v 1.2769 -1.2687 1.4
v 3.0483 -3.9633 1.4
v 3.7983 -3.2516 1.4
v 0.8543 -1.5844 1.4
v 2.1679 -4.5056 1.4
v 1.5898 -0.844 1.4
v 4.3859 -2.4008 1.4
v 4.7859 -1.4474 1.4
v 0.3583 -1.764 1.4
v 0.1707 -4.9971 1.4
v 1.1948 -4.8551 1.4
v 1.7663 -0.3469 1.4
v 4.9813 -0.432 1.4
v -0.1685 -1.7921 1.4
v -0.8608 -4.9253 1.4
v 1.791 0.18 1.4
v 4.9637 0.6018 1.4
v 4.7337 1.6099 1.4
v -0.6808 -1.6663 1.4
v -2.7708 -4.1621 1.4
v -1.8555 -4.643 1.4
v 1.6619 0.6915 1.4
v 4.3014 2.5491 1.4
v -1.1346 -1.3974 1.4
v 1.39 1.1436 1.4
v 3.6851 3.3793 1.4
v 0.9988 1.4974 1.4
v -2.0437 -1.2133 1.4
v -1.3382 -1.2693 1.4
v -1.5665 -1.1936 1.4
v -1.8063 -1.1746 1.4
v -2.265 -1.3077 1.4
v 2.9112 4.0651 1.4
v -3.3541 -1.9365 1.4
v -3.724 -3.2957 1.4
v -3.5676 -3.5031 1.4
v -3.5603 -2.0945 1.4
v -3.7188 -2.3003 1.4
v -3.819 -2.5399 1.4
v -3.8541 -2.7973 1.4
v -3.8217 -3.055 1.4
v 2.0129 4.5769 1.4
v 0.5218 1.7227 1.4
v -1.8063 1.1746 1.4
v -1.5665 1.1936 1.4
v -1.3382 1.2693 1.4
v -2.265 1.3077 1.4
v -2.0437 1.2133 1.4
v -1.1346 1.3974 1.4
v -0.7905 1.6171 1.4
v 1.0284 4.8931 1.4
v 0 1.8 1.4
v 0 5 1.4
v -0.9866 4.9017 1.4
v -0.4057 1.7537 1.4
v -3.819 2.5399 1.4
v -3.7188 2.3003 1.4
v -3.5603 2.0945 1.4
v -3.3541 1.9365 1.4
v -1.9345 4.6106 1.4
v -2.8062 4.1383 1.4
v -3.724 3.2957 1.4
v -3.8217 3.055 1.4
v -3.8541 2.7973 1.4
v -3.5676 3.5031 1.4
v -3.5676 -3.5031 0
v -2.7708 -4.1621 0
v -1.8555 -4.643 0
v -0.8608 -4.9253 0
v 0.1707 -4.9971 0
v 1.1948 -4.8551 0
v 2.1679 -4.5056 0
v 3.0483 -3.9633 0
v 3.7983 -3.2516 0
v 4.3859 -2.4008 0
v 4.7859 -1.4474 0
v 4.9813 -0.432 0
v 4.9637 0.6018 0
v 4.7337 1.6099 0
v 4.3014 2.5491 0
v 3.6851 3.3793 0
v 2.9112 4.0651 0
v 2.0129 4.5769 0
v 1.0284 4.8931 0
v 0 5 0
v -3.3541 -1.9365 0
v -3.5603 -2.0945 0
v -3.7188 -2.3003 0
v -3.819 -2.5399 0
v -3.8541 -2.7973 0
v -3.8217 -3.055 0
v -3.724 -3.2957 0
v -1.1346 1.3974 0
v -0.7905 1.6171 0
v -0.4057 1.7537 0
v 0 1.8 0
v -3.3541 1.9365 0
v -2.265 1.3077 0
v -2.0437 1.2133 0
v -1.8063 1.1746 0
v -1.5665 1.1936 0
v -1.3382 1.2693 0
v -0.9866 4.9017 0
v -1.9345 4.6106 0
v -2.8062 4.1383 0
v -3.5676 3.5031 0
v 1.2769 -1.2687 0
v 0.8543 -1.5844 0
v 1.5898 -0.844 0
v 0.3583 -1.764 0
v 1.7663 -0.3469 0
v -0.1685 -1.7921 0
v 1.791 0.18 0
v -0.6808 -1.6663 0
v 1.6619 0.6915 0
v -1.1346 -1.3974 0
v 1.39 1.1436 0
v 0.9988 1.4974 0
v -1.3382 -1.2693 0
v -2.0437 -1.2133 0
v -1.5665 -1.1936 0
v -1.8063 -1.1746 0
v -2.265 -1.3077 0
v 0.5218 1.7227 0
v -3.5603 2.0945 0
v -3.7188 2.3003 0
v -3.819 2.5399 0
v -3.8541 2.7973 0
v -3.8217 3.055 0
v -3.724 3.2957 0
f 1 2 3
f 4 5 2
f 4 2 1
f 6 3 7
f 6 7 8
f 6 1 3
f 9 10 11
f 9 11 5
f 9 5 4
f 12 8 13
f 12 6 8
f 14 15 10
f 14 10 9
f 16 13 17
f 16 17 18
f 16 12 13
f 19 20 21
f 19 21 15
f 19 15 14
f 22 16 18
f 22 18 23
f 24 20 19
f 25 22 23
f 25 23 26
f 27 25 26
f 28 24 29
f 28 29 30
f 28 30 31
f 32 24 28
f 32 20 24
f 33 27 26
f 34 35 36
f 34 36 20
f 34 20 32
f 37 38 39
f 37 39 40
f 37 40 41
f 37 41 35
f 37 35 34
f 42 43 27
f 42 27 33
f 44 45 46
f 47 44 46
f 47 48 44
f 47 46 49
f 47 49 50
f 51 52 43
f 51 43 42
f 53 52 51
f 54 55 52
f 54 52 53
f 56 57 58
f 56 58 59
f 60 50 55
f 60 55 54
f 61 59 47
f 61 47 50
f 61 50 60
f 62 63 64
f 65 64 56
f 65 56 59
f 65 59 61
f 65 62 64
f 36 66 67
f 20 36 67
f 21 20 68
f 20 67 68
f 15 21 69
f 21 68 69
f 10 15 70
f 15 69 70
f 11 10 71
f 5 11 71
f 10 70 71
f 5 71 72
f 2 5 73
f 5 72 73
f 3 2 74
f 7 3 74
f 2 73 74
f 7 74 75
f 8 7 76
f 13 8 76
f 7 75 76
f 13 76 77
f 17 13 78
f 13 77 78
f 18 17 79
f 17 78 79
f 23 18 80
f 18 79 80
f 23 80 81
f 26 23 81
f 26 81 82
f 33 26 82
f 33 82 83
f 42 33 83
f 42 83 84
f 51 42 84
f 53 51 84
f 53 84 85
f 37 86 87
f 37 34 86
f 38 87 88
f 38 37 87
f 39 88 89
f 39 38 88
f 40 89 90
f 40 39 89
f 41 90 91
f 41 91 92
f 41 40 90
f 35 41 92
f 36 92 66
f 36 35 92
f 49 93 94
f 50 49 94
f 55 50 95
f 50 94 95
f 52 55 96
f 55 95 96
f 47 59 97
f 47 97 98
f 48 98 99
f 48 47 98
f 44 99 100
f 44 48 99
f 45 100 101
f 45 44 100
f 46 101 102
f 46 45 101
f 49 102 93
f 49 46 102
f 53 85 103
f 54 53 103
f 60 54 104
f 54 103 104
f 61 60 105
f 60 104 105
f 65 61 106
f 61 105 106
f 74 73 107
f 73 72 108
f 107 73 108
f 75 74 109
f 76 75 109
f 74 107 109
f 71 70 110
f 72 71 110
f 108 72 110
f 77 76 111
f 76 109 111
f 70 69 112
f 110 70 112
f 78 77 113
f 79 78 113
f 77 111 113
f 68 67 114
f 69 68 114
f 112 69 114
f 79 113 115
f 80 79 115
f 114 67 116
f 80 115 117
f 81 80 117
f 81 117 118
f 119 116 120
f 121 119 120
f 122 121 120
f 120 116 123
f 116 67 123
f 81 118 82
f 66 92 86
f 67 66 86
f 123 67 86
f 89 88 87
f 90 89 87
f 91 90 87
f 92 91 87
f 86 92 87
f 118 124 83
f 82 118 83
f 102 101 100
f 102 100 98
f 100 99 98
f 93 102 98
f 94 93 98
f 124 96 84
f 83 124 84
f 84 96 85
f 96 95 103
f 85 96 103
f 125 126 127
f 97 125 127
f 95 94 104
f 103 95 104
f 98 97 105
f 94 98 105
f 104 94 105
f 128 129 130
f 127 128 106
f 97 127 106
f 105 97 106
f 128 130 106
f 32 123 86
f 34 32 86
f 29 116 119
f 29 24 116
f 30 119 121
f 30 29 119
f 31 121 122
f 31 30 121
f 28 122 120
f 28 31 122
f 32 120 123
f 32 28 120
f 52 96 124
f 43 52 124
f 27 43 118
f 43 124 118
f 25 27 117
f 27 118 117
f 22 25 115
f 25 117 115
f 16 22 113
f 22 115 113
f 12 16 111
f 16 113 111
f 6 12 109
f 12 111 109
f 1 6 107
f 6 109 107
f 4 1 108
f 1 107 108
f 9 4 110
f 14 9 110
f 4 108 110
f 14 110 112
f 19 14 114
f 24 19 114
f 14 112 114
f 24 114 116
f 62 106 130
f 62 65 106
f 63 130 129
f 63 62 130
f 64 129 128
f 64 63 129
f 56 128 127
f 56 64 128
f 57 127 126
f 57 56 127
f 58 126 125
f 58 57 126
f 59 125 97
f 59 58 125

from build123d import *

# Parameters (mm, degrees)
BOSS_EXTRU_1_DEPTH = 1.4
CONG_1_R           = 1


with BuildPart() as part:
    # Esquisse1 → Boss.-Extru.1 (new body)
    with BuildSketch(Plane(origin=(0, 0, 0), x_dir=(0, 1, 0), z_dir=(0, 0, 1))):
        with BuildLine():
            ThreePointArc((1.8, 0), (-0.9, -1.558845727), (-0.9, 1.558845727))
            Line((-0.9, 1.558845727), (-2.5, 4.330127019))
            ThreePointArc((-2.5, 4.330127019), (-2.5, -4.330127019), (5, 0))
            ThreePointArc((5, 0), (4.330127019, 2.5), (2.5, 4.330127019))
            Line((2.5, 4.330127019), (0.9, 1.558845727))
            ThreePointArc((0.9, 1.558845727), (1.558845727, 0.9), (1.8, 0))
        make_face()
    extrude(amount=BOSS_EXTRU_1_DEPTH)

    # Congé1
    cong_1_edges = [part.edges().sort_by_distance(p)[0] for p in [
        (-1.558845727, -0.9, 0.7),
        (-1.558845727, 0.9, 0.7),
        (-4.330127019, 2.5, 0.7),
        (-4.330127019, -2.5, 0.7),
    ]]
    fillet(cong_1_edges, radius=CONG_1_R)


solid = part.part
